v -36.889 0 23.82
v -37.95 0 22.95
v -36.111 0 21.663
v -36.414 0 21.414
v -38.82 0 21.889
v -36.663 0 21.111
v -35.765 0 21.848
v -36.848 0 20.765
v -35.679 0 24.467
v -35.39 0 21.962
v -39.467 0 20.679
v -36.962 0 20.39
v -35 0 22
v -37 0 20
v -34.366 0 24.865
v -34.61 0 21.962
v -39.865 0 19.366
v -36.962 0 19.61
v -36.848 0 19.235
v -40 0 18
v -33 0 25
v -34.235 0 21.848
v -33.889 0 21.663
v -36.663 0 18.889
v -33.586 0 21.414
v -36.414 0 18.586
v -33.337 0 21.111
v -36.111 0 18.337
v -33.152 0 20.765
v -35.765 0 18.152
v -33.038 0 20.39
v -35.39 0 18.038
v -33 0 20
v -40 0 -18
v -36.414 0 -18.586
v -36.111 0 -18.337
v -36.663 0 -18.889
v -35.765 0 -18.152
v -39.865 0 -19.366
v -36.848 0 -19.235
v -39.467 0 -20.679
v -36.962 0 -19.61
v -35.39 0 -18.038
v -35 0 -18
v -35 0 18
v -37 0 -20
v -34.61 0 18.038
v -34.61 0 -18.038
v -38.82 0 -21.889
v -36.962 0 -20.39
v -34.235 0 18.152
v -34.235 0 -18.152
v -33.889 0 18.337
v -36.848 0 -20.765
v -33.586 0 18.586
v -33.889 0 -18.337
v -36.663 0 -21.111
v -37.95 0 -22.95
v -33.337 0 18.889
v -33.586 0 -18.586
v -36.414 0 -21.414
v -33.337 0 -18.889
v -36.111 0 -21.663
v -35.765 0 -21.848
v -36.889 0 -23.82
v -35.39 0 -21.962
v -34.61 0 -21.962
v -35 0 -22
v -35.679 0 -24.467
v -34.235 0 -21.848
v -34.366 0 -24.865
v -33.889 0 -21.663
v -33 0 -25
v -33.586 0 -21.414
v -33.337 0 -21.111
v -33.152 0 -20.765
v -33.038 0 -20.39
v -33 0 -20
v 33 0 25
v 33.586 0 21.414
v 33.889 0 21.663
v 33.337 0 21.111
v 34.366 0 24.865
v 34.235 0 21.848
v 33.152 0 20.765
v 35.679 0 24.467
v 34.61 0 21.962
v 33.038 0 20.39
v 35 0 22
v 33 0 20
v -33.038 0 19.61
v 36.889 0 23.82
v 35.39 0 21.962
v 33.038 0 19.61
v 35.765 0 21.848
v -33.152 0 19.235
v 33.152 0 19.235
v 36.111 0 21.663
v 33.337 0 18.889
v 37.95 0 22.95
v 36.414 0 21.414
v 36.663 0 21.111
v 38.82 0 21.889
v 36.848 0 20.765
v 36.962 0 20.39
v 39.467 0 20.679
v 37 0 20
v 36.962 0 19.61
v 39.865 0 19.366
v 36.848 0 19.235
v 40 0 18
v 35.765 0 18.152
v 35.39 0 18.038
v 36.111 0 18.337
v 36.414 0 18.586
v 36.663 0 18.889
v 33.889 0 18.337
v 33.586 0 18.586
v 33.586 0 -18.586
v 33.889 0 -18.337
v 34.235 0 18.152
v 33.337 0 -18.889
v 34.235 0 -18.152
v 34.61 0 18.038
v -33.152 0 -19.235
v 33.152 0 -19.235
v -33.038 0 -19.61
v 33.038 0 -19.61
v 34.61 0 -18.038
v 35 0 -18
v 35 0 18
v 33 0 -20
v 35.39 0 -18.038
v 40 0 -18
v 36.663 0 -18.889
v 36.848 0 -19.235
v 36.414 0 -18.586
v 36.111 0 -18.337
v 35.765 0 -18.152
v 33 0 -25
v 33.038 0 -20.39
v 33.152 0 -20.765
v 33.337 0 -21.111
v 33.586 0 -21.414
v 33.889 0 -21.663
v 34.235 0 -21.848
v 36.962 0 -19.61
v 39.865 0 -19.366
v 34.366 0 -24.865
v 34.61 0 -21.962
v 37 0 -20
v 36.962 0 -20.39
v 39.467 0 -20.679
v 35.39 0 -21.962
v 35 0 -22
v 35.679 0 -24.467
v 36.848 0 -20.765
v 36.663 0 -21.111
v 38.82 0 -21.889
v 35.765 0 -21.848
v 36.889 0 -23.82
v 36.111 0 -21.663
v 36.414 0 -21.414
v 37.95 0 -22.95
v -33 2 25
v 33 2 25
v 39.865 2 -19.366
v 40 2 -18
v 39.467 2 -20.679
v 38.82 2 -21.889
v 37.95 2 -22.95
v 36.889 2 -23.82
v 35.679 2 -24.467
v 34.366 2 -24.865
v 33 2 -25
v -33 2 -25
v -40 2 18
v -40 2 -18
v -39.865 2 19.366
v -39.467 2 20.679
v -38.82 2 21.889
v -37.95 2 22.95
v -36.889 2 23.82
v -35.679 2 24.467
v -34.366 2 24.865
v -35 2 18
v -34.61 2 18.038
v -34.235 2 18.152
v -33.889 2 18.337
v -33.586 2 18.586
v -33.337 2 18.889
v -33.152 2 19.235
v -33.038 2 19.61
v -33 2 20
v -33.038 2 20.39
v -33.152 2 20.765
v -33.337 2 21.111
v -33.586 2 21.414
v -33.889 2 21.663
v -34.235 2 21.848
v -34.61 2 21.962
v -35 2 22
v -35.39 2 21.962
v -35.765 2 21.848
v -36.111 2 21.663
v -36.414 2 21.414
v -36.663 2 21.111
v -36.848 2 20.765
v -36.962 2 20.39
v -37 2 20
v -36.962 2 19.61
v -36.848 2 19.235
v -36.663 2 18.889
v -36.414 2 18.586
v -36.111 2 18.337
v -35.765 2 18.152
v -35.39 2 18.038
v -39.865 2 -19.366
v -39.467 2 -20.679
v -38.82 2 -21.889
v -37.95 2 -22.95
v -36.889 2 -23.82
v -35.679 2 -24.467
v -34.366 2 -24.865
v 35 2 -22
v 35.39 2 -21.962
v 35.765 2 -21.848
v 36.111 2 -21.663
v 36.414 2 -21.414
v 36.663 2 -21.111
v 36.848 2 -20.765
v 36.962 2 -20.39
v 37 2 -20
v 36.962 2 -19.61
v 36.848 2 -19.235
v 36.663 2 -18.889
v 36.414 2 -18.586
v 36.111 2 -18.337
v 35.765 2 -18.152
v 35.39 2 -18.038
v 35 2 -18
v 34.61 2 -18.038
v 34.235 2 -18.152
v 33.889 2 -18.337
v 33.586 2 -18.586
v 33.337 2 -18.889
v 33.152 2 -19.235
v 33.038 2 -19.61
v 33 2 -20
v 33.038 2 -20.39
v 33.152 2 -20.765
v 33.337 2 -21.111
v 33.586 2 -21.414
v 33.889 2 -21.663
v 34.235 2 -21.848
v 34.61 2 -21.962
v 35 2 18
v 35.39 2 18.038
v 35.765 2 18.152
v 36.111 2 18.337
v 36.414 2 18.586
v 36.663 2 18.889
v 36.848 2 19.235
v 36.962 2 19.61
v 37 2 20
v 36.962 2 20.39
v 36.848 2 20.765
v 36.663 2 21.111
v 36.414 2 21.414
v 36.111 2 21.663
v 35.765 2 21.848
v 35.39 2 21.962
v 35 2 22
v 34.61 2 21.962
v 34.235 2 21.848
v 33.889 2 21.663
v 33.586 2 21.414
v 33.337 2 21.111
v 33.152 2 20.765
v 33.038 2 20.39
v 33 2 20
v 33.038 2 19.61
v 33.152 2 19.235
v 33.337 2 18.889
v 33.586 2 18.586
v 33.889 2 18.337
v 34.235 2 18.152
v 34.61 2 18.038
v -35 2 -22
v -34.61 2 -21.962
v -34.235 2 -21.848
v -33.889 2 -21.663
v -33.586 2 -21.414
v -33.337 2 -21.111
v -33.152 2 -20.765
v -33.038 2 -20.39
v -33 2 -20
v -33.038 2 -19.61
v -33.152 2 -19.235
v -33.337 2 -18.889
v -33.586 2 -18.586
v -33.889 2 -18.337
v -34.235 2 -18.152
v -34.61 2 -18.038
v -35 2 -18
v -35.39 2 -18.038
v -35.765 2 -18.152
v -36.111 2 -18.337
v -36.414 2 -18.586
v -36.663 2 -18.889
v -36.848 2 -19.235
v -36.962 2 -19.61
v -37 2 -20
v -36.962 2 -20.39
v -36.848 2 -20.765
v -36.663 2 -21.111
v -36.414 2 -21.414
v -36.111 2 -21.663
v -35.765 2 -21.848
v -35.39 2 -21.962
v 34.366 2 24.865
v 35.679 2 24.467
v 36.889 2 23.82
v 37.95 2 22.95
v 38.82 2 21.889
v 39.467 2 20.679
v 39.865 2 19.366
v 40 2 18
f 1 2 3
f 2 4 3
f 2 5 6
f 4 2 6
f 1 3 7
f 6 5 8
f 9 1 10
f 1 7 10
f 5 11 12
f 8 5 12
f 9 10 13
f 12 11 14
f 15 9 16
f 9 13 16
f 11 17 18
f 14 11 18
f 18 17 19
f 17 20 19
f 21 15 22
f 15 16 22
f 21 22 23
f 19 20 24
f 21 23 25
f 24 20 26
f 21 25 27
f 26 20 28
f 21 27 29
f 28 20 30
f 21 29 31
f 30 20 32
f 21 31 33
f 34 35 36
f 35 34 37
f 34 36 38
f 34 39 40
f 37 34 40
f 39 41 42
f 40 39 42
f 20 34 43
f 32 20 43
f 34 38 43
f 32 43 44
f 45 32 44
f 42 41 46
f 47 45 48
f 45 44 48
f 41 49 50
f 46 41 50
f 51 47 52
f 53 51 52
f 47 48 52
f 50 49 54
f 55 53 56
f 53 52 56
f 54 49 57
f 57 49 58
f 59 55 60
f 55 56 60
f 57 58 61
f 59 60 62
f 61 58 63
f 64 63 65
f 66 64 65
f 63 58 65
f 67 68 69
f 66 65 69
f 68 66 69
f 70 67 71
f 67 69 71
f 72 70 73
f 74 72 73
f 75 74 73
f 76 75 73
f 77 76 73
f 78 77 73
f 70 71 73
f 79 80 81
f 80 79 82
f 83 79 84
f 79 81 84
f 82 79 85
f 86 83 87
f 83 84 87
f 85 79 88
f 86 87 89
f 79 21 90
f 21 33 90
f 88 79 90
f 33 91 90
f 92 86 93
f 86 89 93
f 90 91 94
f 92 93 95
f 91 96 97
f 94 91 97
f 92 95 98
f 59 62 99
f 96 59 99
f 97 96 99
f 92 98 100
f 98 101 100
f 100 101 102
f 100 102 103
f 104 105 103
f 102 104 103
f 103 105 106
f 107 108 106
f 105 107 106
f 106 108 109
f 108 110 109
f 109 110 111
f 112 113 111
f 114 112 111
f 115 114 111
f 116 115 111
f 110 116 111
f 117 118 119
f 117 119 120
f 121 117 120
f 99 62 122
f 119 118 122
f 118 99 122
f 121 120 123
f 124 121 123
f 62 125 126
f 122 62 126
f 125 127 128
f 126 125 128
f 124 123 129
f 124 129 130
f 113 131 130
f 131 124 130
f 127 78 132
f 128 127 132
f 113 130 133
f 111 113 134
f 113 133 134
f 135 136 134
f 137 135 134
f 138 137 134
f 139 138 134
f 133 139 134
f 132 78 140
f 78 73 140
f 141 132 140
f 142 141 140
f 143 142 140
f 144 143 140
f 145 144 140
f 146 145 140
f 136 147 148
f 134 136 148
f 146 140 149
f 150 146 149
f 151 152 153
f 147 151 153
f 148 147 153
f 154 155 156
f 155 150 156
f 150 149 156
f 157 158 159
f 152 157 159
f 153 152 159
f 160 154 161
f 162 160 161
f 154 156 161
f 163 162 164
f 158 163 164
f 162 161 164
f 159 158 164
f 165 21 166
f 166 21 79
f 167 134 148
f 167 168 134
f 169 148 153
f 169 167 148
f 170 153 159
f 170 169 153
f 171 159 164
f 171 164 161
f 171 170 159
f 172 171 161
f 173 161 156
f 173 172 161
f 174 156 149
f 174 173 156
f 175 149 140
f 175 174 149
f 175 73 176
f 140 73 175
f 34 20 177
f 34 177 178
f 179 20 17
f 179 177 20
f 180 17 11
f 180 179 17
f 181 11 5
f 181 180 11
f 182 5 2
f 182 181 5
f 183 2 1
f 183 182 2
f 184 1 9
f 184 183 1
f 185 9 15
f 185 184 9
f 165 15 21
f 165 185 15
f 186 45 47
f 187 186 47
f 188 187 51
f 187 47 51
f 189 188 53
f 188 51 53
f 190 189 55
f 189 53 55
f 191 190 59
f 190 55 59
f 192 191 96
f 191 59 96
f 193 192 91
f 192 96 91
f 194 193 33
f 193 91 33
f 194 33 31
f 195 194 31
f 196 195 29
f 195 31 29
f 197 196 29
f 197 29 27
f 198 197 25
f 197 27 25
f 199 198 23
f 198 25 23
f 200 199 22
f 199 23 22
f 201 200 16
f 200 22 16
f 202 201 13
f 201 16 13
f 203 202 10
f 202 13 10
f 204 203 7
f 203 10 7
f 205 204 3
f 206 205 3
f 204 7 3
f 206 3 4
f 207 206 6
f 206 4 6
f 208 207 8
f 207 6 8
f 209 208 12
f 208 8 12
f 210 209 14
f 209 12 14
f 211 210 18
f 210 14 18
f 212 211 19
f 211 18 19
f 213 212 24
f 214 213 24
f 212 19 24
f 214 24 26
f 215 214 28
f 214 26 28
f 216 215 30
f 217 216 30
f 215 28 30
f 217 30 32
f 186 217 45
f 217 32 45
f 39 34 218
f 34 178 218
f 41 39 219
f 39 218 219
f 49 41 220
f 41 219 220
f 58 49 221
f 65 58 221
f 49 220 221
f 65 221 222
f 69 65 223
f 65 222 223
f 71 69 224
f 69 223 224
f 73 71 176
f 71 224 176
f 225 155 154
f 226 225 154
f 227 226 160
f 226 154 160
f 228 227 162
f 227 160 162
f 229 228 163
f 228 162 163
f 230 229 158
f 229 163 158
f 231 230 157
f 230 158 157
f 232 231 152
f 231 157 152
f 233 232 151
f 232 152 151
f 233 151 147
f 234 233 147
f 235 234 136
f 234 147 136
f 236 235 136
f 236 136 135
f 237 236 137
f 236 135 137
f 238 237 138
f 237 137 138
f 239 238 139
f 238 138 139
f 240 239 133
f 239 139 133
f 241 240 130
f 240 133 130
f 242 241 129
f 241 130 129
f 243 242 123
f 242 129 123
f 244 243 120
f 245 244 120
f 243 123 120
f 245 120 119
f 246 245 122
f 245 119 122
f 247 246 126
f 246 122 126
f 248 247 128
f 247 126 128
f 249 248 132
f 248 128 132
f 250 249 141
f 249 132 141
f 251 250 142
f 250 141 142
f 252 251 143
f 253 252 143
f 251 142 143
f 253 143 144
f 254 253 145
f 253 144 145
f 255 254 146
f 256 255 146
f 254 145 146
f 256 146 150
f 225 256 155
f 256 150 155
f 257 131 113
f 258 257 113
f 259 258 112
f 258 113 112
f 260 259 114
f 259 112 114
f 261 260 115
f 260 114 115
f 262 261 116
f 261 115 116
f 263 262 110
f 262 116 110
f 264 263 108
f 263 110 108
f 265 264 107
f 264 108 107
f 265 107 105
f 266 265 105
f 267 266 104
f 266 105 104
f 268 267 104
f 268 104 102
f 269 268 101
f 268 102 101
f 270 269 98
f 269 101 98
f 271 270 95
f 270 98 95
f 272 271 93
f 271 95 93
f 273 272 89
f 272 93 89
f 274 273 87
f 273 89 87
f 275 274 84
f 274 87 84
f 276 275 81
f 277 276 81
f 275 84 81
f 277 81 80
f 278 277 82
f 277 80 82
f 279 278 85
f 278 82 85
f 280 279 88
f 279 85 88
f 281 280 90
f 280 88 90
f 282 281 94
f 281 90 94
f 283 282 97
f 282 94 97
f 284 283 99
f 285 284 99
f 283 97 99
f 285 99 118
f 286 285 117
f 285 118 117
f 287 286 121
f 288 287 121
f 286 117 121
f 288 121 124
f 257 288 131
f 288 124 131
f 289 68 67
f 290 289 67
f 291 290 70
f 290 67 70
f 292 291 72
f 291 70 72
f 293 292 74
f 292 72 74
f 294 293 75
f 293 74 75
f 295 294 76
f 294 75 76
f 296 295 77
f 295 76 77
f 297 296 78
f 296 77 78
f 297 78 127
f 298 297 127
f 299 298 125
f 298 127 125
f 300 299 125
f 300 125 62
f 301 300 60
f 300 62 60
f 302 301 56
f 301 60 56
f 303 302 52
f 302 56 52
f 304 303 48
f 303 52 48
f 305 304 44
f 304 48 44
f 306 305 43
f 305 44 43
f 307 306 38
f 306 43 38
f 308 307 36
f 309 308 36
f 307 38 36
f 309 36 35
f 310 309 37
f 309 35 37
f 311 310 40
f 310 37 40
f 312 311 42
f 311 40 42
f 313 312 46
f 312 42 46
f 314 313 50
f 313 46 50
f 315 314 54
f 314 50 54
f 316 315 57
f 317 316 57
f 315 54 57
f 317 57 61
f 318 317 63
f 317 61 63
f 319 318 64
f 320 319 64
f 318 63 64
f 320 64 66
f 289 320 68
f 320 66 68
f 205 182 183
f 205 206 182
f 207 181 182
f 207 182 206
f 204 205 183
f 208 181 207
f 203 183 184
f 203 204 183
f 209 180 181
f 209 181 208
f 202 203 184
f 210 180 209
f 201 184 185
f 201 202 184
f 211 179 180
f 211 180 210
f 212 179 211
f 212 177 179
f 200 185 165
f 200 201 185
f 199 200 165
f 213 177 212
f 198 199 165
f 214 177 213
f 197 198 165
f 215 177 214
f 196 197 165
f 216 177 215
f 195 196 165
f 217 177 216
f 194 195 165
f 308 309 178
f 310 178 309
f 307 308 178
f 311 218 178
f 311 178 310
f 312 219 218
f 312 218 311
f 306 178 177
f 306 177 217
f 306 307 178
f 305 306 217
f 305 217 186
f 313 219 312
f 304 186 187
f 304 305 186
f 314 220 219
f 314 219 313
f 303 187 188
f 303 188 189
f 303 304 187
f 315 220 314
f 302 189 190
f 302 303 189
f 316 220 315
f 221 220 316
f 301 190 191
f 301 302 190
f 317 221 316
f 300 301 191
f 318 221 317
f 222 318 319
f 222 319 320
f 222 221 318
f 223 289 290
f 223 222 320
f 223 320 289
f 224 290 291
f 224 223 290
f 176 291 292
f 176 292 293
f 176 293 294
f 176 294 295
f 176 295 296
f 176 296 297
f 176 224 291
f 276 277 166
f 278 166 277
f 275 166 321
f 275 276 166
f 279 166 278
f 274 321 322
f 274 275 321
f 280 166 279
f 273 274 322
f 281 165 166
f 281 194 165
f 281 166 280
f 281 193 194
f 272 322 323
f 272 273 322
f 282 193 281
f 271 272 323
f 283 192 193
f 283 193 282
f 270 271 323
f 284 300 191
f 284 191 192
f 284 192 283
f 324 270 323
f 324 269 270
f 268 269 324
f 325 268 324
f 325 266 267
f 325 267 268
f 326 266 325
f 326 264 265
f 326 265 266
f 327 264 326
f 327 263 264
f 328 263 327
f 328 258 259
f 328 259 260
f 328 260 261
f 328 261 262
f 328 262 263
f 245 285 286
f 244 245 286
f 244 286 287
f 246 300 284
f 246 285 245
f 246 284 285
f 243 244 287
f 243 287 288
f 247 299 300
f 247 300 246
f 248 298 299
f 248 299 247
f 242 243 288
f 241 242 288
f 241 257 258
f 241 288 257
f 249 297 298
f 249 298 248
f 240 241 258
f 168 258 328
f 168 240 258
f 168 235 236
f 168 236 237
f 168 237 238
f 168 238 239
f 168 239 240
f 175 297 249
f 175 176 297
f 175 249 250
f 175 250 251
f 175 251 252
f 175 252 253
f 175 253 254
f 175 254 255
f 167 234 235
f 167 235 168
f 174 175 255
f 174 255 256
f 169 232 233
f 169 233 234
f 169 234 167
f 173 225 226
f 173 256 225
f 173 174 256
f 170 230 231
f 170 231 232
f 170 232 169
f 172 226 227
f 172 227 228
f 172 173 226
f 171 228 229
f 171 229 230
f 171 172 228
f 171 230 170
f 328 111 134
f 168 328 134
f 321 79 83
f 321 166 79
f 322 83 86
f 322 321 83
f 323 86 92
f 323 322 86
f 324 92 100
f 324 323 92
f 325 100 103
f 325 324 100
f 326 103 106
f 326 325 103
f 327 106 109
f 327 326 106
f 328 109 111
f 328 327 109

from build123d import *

# Parameters (mm, degrees)
SKETCH_LID_W                 = 80
SKETCH_LID_H                 = 50
BOSS_EXTRUDE_LID_DEPTH       = 2
FILLET_CORNERS_R             = 7
SKETCH_SCREW_HOLE_R          = 2
CUT_EXTRUDE_SCREW_HOLE_DEPTH = 2


with BuildPart() as part:
    # Sketch_lid → Boss-Extrude_lid (new body)
    with BuildSketch(Plane(origin=(0, 0, 0), x_dir=(1, 0, 0), z_dir=(0, 1, 0))):
        Rectangle(SKETCH_LID_W, SKETCH_LID_H)
    extrude(amount=BOSS_EXTRUDE_LID_DEPTH)

    # Fillet_corners
    fillet_corners_edges = [part.edges().sort_by_distance(p)[0] for p in [
        (40, 1, 25),
        (-40, 1, 25),
        (-40, 1, -25),
        (40, 1, -25),
    ]]
    fillet(fillet_corners_edges, radius=FILLET_CORNERS_R)

    # Sketch_screw_hole → Cut-Extrude_screw_hole (cut)
    with BuildSketch(Plane.XZ):
        with Locations(Location((-35, -20, 0), (0, 0, 270))):
            Circle(SKETCH_SCREW_HOLE_R)
        with Locations(Location((35, -20, 0), (0, 0, 270))):
            Circle(SKETCH_SCREW_HOLE_R)
        with Locations(Location((35, 20, 0), (0, 0, 270))):
            Circle(SKETCH_SCREW_HOLE_R)
        with Locations(Location((-35, 20, 0), (0, 0, 270))):
            Circle(SKETCH_SCREW_HOLE_R)
    extrude(amount=-CUT_EXTRUDE_SCREW_HOLE_DEPTH, mode=Mode.SUBTRACT)


solid = part.part
